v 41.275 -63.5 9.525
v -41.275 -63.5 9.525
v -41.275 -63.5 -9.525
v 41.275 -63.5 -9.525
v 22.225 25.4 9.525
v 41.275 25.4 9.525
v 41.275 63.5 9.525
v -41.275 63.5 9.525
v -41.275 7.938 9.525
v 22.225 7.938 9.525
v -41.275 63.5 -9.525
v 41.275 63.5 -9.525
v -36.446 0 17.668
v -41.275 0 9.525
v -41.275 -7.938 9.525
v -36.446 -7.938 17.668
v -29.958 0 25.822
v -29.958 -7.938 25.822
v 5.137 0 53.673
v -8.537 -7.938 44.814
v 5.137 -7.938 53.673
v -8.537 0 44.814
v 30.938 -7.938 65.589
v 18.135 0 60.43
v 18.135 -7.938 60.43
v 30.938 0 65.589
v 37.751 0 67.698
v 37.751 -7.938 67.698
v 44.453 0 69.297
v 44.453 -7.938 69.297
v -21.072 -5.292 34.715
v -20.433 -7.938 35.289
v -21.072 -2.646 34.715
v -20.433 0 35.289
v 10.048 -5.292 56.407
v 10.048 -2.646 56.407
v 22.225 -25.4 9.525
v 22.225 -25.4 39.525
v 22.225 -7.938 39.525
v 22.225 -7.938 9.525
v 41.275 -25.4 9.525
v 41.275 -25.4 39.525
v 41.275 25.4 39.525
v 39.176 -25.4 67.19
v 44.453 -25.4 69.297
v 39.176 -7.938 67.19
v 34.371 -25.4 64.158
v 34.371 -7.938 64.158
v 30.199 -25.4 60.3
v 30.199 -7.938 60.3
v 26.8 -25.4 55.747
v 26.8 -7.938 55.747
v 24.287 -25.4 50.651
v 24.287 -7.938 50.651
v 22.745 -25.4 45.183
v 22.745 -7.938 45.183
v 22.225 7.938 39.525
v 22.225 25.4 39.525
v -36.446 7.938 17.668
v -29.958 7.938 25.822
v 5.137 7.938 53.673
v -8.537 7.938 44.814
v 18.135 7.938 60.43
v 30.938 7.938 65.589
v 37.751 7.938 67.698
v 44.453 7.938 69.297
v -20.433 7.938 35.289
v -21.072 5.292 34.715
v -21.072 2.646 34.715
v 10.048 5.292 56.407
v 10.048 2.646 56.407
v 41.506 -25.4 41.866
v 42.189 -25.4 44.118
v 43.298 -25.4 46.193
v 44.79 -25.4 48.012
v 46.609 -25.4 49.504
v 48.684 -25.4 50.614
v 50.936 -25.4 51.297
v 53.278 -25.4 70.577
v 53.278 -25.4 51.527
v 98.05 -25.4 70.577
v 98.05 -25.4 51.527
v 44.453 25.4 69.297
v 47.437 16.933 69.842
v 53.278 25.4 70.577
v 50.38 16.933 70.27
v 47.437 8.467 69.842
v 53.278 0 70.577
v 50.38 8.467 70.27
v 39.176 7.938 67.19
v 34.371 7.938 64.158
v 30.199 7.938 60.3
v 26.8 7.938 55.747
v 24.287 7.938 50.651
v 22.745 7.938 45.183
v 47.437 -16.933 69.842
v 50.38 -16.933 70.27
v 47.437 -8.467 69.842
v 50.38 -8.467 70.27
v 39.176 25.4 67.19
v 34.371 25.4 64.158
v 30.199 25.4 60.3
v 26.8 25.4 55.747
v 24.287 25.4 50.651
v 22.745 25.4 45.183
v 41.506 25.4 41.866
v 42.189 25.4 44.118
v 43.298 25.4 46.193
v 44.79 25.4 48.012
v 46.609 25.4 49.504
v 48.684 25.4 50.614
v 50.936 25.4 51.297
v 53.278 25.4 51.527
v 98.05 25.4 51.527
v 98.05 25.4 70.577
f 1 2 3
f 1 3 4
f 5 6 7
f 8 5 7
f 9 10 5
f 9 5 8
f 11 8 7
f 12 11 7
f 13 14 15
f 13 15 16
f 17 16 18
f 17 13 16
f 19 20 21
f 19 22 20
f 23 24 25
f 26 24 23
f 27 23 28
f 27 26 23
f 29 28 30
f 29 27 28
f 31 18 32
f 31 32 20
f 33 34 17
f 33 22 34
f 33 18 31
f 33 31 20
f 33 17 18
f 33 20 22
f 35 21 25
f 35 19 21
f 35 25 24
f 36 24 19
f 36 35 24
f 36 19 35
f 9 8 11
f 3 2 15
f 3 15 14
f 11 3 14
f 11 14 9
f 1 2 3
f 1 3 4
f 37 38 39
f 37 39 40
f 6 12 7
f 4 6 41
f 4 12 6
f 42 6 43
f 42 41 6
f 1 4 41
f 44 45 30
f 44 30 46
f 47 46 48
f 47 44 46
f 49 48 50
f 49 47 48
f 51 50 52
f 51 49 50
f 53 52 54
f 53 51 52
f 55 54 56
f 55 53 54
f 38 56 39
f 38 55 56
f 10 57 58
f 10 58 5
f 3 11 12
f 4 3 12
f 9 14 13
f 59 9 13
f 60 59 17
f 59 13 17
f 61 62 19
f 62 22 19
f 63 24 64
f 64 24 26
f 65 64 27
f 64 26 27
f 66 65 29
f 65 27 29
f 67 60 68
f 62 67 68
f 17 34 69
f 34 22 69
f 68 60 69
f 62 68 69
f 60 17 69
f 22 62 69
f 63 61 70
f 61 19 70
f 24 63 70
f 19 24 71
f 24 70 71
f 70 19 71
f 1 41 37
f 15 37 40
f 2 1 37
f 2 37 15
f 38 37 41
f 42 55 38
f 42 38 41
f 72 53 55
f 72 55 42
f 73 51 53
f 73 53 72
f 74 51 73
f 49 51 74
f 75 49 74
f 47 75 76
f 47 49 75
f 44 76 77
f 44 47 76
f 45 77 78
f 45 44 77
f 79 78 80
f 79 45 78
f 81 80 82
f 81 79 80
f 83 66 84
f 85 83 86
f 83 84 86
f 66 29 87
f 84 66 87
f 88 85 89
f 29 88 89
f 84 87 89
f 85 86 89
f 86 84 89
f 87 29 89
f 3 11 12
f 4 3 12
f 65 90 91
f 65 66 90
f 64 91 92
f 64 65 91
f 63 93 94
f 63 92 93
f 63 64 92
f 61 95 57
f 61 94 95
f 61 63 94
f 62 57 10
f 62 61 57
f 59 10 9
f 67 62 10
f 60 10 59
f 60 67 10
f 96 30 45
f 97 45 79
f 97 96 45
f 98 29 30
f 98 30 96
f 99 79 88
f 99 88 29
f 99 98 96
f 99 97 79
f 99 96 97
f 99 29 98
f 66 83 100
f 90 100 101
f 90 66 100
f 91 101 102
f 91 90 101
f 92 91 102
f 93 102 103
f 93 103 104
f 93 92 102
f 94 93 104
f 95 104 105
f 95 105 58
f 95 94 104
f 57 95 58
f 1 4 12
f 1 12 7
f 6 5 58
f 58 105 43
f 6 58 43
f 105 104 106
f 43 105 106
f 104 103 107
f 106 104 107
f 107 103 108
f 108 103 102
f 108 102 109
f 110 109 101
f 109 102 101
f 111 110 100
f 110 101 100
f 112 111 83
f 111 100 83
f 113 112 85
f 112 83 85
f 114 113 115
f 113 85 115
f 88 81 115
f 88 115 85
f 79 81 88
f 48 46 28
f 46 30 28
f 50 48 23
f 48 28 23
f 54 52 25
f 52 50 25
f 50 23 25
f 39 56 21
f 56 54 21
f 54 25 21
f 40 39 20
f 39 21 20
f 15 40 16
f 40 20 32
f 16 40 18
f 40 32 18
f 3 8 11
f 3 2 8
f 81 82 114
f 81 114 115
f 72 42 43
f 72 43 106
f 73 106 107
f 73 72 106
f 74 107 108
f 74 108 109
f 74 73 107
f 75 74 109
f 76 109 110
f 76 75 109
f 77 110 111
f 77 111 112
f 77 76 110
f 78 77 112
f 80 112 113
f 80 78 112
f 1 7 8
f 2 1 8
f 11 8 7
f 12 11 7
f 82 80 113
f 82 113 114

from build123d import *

# Parameters (mm, degrees)
F1_DEPTH = 63.5
F0_W     = 25.4
F0_H     = 15.5858107232
F2_DEPTH = 25.4
F3_DEPTH = 7.9375
F4_DEPTH = 63.5


with BuildPart() as f1:
    # F0 (on Front) → F1 (new body, symmetric)
    with BuildSketch(Plane.XZ):
        Polygon((22.225, 9.525), (-41.275, 9.525), (-41.275, -9.525), (41.275, -9.525), (41.275, 9.525), align=None)
    extrude(amount=F1_DEPTH, both=True)

    # F0 (on Front) → F2 (join, symmetric)
    with BuildSketch(Plane.XZ):
        with BuildLine():
            Line((22.225, 39.5245600989), (22.225, 9.525))
            Line((22.225, 9.525), (41.275, 9.525))
            Line((41.275, 9.525), (41.275, 39.5245600989))
            ThreePointArc((41.275, 39.5245600989), (44.7904831194, 48.0116871241), (53.2776101446, 51.5271702435))
            Line((53.2776101446, 51.5271702435), (72.6495390284, 51.5271702435))
            Line((72.6495390284, 51.5271702435), (72.6495390284, 67.1129809667))
            Line((72.6495390284, 67.1129809667), (98.0495390284, 67.1129809667))
            Line((98.0495390284, 67.1129809667), (98.0495390284, 70.5771702435))
            Line((98.0495390284, 70.5771702435), (53.2776101446, 70.5771702435))
            add(Edge.make_bspline(
                [(44.4526718626, 69.2967797191), (47.4549361429, 69.89917945), (50.4048214922, 70.3316993525), (53.2776101446, 70.5771702435)],
                knots=[103.2938203641, 103.2938203641, 103.2938203641, 103.2938203641, 112.5502713306, 112.5502713306, 112.5502713306, 112.5502713306], degree=3))
            ThreePointArc((44.4526718626, 69.2967797191), (28.3948654727, 58.1017938646), (22.225, 39.5245600989))
        make_face()
        with Locations((85.3495390284, 59.3200756051)):
            Rectangle(F0_W, F0_H)
    extrude(amount=F2_DEPTH, both=True)

    # F0 (on Front) → F3 (join, symmetric)
    with BuildSketch(Plane.XZ):
        with BuildLine():
            add(Edge.make_bspline(
                [(-41.275, 9.525), (-29.0750987813, 34.6978438108), (10.9500531616, 62.5745305742), (44.4526718626, 69.2967797191)],
                knots=[0, 0, 0, 0, 103.2938203641, 103.2938203641, 103.2938203641, 103.2938203641], degree=3))
            Line((-41.275, 9.525), (22.225, 9.525))
            Line((22.225, 9.525), (22.225, 39.5245600989))
            ThreePointArc((22.225, 39.5245600989), (28.3948654727, 58.1017938646), (44.4526718626, 69.2967797191))
        make_face()
    extrude(amount=F3_DEPTH, both=True)


with BuildPart() as f4:
    # F0 (on Front) → F4 (new body, symmetric)
    with BuildSketch(Plane.XZ):
        Polygon((22.225, 9.525), (-41.275, 9.525), (-41.275, -9.525), (41.275, -9.525), (41.275, 9.525), align=None)
    extrude(amount=F4_DEPTH, both=True)


solid = Compound([f1.part, f4.part])
